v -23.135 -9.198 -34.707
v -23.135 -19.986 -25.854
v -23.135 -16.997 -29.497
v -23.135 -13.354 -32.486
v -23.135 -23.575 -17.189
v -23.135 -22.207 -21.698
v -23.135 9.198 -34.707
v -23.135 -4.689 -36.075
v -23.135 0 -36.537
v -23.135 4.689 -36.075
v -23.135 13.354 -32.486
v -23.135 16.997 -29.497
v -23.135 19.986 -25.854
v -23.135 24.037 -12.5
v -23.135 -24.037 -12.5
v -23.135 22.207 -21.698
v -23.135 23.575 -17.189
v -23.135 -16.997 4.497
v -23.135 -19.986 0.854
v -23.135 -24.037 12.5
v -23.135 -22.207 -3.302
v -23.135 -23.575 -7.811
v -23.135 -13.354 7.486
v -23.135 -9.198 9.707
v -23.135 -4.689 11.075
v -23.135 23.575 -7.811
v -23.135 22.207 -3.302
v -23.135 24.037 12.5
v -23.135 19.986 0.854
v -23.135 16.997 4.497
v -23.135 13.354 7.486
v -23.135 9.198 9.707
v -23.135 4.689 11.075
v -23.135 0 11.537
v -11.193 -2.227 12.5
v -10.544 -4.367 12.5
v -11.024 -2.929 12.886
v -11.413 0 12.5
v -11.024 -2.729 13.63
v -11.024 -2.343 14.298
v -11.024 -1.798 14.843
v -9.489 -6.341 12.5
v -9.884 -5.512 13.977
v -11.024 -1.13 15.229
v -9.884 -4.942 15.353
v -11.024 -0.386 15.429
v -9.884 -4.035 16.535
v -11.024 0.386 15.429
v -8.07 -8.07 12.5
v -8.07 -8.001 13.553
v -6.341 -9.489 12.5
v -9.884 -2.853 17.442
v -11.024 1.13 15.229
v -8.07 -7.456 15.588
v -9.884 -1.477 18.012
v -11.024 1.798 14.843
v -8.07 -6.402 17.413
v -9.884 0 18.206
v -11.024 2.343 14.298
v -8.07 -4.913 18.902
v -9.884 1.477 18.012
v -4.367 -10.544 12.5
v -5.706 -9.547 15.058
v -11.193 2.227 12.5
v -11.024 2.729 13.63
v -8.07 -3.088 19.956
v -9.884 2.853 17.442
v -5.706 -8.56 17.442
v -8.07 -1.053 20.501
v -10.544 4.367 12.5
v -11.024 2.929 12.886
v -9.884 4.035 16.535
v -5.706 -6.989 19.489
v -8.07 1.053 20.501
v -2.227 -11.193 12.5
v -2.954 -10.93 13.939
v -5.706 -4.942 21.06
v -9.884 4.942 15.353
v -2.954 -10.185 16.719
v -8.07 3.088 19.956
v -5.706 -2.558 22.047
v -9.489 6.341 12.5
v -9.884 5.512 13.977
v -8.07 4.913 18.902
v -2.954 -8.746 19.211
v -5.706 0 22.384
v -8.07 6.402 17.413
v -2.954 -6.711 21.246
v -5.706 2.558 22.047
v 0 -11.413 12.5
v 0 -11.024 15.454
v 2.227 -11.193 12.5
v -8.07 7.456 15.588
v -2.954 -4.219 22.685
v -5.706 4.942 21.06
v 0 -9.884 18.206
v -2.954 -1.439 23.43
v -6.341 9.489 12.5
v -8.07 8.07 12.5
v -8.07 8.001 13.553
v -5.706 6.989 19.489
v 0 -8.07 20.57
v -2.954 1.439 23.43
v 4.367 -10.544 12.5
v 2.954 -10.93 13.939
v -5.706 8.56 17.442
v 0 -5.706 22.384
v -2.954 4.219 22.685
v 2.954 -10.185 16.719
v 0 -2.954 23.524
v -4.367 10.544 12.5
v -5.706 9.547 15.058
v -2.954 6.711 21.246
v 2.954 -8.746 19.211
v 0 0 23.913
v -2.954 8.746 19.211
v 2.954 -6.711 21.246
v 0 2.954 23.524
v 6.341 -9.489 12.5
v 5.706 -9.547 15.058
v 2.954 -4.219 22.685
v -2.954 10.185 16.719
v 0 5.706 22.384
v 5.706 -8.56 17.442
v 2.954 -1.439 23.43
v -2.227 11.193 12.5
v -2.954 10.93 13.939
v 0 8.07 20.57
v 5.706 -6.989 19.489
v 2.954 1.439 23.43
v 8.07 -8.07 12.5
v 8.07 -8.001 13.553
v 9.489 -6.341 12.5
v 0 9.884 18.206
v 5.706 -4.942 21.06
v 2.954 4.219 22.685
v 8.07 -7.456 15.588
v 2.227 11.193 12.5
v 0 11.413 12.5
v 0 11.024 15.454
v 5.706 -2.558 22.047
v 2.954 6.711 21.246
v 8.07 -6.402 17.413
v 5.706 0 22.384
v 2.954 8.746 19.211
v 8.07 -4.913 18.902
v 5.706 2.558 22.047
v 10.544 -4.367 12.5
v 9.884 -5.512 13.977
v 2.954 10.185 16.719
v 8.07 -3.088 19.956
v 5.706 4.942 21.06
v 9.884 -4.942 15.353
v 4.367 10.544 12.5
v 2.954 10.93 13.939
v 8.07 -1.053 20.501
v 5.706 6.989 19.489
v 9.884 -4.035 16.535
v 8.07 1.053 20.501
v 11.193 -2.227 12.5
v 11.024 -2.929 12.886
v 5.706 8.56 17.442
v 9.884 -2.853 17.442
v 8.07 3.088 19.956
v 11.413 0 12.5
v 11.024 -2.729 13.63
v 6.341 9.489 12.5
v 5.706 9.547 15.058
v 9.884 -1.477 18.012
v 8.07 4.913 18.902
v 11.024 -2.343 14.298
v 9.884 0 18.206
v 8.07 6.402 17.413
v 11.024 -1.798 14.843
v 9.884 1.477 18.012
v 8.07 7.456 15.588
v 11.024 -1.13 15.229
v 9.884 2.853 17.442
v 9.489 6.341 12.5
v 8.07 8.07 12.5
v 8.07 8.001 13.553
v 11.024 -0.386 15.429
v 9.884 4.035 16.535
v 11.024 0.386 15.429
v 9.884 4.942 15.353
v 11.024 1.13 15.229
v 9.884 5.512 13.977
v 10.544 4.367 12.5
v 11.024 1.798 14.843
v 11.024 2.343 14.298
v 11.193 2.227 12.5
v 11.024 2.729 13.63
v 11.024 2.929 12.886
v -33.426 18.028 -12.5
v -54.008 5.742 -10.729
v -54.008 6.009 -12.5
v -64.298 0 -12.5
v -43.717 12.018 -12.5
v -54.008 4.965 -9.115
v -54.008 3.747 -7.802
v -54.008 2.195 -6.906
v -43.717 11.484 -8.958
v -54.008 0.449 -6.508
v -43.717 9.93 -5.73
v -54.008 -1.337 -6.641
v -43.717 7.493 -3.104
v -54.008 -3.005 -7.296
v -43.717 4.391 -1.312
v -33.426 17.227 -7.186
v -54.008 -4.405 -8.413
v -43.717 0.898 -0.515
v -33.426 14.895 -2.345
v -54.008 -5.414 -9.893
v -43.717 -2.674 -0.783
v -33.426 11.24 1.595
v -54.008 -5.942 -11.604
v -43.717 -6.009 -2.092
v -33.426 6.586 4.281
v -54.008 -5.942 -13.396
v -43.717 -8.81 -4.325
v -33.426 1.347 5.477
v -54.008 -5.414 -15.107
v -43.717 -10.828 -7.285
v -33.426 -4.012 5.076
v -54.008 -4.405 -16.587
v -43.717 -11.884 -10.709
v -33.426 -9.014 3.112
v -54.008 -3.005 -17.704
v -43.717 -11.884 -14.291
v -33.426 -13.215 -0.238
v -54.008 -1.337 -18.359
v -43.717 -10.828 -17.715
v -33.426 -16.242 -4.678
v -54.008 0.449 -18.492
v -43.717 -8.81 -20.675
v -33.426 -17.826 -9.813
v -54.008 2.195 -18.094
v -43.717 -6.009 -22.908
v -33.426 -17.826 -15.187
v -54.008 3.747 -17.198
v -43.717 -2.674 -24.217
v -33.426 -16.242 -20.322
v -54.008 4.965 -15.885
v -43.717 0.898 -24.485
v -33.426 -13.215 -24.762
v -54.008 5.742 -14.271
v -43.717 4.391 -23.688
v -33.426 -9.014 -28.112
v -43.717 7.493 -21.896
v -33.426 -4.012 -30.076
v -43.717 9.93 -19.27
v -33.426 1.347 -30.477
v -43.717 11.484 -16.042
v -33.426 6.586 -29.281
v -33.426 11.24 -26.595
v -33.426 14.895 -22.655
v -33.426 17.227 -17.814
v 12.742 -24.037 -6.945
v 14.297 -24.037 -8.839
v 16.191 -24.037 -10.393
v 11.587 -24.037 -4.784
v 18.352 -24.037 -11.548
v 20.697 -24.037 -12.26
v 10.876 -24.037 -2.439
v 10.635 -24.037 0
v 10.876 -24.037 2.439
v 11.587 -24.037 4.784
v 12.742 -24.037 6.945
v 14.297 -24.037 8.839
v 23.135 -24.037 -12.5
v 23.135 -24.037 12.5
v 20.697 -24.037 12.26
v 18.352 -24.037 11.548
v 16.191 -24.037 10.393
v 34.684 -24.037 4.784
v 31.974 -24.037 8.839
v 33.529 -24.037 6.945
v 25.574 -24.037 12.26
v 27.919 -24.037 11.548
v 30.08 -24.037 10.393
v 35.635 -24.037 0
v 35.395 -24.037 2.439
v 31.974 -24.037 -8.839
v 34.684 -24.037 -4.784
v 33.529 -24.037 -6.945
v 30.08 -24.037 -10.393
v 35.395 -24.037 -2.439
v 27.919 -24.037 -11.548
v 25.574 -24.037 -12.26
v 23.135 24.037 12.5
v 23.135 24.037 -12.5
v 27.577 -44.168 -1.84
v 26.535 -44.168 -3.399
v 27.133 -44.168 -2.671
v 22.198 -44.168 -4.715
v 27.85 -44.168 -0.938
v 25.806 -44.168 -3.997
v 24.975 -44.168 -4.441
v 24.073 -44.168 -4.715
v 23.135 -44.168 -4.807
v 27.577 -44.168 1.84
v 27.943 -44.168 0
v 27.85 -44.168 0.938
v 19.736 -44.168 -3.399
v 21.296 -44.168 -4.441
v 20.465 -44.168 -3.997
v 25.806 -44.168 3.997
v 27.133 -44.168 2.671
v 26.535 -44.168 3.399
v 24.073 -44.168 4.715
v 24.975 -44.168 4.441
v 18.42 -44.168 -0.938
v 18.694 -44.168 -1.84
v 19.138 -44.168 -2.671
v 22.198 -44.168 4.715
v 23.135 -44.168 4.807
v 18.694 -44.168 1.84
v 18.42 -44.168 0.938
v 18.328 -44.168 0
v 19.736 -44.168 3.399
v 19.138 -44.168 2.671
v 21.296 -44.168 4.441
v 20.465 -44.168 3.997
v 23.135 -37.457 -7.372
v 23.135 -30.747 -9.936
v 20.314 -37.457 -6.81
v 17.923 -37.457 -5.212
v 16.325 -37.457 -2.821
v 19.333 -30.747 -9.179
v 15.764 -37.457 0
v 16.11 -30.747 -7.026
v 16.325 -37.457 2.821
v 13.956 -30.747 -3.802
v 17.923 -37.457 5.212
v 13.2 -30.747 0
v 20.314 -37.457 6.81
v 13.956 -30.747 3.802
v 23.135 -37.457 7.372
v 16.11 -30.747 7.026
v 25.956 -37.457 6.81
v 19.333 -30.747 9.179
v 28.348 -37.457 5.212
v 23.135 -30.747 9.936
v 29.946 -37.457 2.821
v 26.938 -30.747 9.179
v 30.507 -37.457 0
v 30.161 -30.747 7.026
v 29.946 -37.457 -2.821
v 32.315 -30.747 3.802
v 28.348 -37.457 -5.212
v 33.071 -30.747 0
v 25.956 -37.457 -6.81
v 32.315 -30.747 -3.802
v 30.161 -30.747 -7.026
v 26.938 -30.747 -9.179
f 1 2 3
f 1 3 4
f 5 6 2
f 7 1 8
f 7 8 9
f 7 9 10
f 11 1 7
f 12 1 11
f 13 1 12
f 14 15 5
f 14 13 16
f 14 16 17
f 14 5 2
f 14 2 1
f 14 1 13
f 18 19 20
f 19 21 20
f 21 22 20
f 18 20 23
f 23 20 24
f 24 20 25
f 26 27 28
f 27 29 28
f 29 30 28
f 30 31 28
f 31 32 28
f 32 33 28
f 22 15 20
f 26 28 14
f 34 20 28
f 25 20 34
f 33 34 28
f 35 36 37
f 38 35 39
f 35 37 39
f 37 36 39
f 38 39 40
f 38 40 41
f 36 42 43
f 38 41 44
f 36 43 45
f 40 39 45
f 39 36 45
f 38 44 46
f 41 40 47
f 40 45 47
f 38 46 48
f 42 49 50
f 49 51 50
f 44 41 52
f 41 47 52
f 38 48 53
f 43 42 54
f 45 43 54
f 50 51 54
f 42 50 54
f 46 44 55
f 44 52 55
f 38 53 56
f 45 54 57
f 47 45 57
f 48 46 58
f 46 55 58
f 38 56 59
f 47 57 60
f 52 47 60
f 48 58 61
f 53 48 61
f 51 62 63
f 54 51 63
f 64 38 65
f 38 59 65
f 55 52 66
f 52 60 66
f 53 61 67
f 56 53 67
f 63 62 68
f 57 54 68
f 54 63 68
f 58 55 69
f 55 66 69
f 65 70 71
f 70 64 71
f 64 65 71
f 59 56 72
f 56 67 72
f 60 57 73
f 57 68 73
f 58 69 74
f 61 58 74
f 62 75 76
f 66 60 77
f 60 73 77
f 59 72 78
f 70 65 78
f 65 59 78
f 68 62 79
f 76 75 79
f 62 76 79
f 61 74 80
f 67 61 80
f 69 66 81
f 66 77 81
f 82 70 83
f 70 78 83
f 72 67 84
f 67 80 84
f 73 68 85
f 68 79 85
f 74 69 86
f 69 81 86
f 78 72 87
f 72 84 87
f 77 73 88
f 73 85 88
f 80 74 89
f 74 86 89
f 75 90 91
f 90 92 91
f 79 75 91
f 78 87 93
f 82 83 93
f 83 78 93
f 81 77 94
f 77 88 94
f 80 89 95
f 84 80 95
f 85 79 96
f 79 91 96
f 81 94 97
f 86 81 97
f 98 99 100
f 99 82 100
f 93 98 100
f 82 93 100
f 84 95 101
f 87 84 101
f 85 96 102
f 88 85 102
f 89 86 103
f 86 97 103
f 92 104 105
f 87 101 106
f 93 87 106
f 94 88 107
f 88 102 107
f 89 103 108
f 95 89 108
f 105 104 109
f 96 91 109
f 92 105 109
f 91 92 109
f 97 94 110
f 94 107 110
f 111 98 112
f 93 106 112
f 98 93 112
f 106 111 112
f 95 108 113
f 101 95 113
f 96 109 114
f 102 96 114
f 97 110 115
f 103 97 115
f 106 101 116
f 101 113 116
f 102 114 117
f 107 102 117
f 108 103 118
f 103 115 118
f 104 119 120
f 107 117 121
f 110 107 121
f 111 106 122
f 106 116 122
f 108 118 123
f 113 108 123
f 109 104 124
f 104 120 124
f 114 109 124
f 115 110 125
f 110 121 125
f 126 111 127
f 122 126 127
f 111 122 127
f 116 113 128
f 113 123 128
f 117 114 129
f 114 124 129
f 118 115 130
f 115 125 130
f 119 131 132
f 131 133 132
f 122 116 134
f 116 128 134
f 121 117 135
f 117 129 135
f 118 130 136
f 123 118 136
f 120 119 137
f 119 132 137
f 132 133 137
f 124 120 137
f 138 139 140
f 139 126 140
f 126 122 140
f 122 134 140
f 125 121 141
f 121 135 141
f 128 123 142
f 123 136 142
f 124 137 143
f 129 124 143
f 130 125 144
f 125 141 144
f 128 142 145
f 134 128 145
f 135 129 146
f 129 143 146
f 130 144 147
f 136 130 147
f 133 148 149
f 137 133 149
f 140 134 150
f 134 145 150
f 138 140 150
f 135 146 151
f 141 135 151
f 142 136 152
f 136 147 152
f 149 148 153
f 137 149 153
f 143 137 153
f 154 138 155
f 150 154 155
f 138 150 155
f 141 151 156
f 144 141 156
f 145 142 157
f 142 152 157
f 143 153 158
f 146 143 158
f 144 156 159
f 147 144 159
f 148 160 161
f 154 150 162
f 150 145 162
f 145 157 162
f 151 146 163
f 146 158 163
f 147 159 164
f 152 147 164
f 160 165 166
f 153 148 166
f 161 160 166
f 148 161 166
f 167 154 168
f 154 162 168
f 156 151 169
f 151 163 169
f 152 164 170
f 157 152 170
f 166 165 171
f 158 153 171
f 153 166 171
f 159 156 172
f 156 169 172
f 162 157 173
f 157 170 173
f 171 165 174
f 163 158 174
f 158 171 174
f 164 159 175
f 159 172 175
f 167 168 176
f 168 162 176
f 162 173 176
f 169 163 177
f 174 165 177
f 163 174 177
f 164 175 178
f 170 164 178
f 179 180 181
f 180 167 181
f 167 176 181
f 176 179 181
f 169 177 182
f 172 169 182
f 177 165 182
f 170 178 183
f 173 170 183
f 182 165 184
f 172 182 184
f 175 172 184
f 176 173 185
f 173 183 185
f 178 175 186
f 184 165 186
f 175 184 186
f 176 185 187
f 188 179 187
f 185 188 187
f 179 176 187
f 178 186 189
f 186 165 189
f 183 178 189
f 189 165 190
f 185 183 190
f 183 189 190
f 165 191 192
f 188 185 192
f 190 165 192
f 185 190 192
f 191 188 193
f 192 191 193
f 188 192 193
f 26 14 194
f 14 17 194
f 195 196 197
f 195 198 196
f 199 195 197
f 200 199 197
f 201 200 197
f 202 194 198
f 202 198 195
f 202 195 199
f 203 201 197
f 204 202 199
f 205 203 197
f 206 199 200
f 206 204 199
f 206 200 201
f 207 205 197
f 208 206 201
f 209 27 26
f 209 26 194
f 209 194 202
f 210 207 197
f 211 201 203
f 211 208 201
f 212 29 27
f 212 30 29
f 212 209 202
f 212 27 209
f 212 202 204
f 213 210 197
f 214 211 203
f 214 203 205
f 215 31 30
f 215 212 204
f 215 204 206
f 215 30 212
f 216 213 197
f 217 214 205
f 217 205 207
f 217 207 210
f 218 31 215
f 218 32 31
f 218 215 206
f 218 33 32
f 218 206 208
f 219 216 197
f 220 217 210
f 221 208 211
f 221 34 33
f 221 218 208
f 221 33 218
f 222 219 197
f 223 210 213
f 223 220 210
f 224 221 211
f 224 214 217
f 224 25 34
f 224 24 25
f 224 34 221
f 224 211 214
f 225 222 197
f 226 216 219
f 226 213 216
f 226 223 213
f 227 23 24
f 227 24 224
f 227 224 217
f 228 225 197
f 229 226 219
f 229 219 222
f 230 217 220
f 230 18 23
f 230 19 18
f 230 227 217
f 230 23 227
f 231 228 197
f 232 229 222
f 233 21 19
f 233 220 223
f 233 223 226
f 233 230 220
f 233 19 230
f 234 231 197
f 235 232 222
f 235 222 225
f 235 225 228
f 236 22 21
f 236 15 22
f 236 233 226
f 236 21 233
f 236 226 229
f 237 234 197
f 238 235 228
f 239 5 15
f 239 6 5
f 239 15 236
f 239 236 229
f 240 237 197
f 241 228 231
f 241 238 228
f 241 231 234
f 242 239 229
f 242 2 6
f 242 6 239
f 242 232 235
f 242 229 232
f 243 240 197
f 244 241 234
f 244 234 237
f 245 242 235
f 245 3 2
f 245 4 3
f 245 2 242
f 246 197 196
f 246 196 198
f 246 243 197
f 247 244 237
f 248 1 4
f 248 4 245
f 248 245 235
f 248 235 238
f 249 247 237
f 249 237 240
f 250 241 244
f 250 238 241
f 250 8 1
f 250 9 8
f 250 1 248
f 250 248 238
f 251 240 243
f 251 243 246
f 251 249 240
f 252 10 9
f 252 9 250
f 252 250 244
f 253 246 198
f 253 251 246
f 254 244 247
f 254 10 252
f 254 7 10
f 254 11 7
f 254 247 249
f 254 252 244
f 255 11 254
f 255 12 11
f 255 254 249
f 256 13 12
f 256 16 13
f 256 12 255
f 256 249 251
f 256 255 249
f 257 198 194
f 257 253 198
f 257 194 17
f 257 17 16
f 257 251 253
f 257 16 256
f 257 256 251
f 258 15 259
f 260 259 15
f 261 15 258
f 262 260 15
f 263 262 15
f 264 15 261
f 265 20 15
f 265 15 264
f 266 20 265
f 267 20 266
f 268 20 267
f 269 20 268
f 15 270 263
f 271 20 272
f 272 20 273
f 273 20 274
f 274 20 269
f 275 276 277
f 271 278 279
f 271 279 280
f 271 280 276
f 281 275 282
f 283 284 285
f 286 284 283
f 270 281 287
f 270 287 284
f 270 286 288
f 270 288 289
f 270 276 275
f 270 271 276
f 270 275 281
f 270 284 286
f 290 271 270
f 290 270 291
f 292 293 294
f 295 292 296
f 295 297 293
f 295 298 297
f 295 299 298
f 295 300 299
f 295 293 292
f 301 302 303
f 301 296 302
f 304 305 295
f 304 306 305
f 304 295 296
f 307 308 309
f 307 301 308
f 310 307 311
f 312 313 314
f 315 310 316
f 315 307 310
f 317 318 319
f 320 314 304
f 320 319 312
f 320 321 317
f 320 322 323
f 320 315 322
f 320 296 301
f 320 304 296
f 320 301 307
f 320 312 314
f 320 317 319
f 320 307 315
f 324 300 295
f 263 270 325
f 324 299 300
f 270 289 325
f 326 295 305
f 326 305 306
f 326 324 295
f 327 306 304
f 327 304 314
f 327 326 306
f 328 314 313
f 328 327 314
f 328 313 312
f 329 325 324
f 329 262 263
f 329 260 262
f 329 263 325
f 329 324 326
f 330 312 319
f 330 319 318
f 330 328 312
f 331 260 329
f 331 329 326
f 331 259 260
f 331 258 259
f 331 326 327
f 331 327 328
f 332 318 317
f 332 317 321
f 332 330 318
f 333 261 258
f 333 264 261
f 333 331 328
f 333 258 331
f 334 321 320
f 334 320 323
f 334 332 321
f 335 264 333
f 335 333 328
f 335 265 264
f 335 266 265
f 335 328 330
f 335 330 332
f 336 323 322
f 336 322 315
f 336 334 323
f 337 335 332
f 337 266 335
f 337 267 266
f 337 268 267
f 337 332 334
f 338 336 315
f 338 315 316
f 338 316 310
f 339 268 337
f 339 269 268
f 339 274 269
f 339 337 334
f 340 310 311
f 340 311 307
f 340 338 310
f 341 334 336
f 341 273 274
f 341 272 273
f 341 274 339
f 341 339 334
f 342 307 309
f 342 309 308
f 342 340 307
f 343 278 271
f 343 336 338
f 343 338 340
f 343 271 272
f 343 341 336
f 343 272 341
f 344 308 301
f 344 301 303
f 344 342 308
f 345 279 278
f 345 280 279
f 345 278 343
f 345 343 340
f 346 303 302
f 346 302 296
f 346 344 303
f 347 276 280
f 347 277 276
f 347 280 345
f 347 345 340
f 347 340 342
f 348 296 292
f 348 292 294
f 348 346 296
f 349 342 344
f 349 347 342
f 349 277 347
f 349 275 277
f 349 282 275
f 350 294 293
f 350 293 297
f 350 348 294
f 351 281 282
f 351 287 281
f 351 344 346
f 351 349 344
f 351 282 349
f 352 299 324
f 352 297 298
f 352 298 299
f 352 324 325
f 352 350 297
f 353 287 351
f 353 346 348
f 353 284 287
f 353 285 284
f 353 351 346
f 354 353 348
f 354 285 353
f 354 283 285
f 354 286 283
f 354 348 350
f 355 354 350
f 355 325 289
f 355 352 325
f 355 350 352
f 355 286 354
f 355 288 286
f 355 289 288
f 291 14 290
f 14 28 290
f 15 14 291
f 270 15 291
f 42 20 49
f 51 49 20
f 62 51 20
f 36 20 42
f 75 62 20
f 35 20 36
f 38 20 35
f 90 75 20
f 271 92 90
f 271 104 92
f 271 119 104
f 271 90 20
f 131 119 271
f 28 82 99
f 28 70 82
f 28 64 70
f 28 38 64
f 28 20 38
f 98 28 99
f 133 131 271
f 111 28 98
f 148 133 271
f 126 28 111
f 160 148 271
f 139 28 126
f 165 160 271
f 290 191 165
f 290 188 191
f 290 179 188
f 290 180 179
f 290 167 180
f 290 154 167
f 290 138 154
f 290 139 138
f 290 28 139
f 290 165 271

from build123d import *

# Parameters (mm, degrees)
F0_W     = 46.27084
F0_H     = 48.0736
F1_DEPTH = 12.5


with BuildPart() as f1:
    # F0 (on Top) → F1 (new body, symmetric)
    with BuildSketch(Plane.XY):
        Rectangle(F0_W, F0_H)
    extrude(amount=F1_DEPTH, both=True)

    # F2 (on face) → F3 (revolve)
    with BuildSketch(Plane.XY.offset(12.5)):
        with BuildLine():
            Line((0, 0), (-11.412725, 0))
            ThreePointArc((-11.412725, 0), (0, -11.412725), (11.412725, 0))
            Line((11.412725, 0), (0, 0))
        make_face()
    revolve(axis=Axis((0, 0, 12.5), (-1, 0, 0)))

    # F4 (on face) → F5 (revolve)
    with BuildSketch(Plane(origin=(0, 0, -12.5), x_dir=(1, 0, 0), z_dir=(0, 0, -1))):
        Polygon((-64.298436, 0), (-23.13542, -24.0368), (-23.13542, 0), align=None)
    revolve(axis=Axis((-43.716928, 0, -12.5), (1, 0, 0)))

    # F6 (on face) → F7 (revolve)
    with BuildSketch(Plane.YZ.offset(23.13542)):
        Polygon((-44.167623, -4.807361), (-24.0368, -12.5), (-24.0368, 0), (-44.167623, 0), align=None)
    revolve(axis=Axis((23.13542, -34.102212, 0), (0, 1, 0)))


solid = f1.part
